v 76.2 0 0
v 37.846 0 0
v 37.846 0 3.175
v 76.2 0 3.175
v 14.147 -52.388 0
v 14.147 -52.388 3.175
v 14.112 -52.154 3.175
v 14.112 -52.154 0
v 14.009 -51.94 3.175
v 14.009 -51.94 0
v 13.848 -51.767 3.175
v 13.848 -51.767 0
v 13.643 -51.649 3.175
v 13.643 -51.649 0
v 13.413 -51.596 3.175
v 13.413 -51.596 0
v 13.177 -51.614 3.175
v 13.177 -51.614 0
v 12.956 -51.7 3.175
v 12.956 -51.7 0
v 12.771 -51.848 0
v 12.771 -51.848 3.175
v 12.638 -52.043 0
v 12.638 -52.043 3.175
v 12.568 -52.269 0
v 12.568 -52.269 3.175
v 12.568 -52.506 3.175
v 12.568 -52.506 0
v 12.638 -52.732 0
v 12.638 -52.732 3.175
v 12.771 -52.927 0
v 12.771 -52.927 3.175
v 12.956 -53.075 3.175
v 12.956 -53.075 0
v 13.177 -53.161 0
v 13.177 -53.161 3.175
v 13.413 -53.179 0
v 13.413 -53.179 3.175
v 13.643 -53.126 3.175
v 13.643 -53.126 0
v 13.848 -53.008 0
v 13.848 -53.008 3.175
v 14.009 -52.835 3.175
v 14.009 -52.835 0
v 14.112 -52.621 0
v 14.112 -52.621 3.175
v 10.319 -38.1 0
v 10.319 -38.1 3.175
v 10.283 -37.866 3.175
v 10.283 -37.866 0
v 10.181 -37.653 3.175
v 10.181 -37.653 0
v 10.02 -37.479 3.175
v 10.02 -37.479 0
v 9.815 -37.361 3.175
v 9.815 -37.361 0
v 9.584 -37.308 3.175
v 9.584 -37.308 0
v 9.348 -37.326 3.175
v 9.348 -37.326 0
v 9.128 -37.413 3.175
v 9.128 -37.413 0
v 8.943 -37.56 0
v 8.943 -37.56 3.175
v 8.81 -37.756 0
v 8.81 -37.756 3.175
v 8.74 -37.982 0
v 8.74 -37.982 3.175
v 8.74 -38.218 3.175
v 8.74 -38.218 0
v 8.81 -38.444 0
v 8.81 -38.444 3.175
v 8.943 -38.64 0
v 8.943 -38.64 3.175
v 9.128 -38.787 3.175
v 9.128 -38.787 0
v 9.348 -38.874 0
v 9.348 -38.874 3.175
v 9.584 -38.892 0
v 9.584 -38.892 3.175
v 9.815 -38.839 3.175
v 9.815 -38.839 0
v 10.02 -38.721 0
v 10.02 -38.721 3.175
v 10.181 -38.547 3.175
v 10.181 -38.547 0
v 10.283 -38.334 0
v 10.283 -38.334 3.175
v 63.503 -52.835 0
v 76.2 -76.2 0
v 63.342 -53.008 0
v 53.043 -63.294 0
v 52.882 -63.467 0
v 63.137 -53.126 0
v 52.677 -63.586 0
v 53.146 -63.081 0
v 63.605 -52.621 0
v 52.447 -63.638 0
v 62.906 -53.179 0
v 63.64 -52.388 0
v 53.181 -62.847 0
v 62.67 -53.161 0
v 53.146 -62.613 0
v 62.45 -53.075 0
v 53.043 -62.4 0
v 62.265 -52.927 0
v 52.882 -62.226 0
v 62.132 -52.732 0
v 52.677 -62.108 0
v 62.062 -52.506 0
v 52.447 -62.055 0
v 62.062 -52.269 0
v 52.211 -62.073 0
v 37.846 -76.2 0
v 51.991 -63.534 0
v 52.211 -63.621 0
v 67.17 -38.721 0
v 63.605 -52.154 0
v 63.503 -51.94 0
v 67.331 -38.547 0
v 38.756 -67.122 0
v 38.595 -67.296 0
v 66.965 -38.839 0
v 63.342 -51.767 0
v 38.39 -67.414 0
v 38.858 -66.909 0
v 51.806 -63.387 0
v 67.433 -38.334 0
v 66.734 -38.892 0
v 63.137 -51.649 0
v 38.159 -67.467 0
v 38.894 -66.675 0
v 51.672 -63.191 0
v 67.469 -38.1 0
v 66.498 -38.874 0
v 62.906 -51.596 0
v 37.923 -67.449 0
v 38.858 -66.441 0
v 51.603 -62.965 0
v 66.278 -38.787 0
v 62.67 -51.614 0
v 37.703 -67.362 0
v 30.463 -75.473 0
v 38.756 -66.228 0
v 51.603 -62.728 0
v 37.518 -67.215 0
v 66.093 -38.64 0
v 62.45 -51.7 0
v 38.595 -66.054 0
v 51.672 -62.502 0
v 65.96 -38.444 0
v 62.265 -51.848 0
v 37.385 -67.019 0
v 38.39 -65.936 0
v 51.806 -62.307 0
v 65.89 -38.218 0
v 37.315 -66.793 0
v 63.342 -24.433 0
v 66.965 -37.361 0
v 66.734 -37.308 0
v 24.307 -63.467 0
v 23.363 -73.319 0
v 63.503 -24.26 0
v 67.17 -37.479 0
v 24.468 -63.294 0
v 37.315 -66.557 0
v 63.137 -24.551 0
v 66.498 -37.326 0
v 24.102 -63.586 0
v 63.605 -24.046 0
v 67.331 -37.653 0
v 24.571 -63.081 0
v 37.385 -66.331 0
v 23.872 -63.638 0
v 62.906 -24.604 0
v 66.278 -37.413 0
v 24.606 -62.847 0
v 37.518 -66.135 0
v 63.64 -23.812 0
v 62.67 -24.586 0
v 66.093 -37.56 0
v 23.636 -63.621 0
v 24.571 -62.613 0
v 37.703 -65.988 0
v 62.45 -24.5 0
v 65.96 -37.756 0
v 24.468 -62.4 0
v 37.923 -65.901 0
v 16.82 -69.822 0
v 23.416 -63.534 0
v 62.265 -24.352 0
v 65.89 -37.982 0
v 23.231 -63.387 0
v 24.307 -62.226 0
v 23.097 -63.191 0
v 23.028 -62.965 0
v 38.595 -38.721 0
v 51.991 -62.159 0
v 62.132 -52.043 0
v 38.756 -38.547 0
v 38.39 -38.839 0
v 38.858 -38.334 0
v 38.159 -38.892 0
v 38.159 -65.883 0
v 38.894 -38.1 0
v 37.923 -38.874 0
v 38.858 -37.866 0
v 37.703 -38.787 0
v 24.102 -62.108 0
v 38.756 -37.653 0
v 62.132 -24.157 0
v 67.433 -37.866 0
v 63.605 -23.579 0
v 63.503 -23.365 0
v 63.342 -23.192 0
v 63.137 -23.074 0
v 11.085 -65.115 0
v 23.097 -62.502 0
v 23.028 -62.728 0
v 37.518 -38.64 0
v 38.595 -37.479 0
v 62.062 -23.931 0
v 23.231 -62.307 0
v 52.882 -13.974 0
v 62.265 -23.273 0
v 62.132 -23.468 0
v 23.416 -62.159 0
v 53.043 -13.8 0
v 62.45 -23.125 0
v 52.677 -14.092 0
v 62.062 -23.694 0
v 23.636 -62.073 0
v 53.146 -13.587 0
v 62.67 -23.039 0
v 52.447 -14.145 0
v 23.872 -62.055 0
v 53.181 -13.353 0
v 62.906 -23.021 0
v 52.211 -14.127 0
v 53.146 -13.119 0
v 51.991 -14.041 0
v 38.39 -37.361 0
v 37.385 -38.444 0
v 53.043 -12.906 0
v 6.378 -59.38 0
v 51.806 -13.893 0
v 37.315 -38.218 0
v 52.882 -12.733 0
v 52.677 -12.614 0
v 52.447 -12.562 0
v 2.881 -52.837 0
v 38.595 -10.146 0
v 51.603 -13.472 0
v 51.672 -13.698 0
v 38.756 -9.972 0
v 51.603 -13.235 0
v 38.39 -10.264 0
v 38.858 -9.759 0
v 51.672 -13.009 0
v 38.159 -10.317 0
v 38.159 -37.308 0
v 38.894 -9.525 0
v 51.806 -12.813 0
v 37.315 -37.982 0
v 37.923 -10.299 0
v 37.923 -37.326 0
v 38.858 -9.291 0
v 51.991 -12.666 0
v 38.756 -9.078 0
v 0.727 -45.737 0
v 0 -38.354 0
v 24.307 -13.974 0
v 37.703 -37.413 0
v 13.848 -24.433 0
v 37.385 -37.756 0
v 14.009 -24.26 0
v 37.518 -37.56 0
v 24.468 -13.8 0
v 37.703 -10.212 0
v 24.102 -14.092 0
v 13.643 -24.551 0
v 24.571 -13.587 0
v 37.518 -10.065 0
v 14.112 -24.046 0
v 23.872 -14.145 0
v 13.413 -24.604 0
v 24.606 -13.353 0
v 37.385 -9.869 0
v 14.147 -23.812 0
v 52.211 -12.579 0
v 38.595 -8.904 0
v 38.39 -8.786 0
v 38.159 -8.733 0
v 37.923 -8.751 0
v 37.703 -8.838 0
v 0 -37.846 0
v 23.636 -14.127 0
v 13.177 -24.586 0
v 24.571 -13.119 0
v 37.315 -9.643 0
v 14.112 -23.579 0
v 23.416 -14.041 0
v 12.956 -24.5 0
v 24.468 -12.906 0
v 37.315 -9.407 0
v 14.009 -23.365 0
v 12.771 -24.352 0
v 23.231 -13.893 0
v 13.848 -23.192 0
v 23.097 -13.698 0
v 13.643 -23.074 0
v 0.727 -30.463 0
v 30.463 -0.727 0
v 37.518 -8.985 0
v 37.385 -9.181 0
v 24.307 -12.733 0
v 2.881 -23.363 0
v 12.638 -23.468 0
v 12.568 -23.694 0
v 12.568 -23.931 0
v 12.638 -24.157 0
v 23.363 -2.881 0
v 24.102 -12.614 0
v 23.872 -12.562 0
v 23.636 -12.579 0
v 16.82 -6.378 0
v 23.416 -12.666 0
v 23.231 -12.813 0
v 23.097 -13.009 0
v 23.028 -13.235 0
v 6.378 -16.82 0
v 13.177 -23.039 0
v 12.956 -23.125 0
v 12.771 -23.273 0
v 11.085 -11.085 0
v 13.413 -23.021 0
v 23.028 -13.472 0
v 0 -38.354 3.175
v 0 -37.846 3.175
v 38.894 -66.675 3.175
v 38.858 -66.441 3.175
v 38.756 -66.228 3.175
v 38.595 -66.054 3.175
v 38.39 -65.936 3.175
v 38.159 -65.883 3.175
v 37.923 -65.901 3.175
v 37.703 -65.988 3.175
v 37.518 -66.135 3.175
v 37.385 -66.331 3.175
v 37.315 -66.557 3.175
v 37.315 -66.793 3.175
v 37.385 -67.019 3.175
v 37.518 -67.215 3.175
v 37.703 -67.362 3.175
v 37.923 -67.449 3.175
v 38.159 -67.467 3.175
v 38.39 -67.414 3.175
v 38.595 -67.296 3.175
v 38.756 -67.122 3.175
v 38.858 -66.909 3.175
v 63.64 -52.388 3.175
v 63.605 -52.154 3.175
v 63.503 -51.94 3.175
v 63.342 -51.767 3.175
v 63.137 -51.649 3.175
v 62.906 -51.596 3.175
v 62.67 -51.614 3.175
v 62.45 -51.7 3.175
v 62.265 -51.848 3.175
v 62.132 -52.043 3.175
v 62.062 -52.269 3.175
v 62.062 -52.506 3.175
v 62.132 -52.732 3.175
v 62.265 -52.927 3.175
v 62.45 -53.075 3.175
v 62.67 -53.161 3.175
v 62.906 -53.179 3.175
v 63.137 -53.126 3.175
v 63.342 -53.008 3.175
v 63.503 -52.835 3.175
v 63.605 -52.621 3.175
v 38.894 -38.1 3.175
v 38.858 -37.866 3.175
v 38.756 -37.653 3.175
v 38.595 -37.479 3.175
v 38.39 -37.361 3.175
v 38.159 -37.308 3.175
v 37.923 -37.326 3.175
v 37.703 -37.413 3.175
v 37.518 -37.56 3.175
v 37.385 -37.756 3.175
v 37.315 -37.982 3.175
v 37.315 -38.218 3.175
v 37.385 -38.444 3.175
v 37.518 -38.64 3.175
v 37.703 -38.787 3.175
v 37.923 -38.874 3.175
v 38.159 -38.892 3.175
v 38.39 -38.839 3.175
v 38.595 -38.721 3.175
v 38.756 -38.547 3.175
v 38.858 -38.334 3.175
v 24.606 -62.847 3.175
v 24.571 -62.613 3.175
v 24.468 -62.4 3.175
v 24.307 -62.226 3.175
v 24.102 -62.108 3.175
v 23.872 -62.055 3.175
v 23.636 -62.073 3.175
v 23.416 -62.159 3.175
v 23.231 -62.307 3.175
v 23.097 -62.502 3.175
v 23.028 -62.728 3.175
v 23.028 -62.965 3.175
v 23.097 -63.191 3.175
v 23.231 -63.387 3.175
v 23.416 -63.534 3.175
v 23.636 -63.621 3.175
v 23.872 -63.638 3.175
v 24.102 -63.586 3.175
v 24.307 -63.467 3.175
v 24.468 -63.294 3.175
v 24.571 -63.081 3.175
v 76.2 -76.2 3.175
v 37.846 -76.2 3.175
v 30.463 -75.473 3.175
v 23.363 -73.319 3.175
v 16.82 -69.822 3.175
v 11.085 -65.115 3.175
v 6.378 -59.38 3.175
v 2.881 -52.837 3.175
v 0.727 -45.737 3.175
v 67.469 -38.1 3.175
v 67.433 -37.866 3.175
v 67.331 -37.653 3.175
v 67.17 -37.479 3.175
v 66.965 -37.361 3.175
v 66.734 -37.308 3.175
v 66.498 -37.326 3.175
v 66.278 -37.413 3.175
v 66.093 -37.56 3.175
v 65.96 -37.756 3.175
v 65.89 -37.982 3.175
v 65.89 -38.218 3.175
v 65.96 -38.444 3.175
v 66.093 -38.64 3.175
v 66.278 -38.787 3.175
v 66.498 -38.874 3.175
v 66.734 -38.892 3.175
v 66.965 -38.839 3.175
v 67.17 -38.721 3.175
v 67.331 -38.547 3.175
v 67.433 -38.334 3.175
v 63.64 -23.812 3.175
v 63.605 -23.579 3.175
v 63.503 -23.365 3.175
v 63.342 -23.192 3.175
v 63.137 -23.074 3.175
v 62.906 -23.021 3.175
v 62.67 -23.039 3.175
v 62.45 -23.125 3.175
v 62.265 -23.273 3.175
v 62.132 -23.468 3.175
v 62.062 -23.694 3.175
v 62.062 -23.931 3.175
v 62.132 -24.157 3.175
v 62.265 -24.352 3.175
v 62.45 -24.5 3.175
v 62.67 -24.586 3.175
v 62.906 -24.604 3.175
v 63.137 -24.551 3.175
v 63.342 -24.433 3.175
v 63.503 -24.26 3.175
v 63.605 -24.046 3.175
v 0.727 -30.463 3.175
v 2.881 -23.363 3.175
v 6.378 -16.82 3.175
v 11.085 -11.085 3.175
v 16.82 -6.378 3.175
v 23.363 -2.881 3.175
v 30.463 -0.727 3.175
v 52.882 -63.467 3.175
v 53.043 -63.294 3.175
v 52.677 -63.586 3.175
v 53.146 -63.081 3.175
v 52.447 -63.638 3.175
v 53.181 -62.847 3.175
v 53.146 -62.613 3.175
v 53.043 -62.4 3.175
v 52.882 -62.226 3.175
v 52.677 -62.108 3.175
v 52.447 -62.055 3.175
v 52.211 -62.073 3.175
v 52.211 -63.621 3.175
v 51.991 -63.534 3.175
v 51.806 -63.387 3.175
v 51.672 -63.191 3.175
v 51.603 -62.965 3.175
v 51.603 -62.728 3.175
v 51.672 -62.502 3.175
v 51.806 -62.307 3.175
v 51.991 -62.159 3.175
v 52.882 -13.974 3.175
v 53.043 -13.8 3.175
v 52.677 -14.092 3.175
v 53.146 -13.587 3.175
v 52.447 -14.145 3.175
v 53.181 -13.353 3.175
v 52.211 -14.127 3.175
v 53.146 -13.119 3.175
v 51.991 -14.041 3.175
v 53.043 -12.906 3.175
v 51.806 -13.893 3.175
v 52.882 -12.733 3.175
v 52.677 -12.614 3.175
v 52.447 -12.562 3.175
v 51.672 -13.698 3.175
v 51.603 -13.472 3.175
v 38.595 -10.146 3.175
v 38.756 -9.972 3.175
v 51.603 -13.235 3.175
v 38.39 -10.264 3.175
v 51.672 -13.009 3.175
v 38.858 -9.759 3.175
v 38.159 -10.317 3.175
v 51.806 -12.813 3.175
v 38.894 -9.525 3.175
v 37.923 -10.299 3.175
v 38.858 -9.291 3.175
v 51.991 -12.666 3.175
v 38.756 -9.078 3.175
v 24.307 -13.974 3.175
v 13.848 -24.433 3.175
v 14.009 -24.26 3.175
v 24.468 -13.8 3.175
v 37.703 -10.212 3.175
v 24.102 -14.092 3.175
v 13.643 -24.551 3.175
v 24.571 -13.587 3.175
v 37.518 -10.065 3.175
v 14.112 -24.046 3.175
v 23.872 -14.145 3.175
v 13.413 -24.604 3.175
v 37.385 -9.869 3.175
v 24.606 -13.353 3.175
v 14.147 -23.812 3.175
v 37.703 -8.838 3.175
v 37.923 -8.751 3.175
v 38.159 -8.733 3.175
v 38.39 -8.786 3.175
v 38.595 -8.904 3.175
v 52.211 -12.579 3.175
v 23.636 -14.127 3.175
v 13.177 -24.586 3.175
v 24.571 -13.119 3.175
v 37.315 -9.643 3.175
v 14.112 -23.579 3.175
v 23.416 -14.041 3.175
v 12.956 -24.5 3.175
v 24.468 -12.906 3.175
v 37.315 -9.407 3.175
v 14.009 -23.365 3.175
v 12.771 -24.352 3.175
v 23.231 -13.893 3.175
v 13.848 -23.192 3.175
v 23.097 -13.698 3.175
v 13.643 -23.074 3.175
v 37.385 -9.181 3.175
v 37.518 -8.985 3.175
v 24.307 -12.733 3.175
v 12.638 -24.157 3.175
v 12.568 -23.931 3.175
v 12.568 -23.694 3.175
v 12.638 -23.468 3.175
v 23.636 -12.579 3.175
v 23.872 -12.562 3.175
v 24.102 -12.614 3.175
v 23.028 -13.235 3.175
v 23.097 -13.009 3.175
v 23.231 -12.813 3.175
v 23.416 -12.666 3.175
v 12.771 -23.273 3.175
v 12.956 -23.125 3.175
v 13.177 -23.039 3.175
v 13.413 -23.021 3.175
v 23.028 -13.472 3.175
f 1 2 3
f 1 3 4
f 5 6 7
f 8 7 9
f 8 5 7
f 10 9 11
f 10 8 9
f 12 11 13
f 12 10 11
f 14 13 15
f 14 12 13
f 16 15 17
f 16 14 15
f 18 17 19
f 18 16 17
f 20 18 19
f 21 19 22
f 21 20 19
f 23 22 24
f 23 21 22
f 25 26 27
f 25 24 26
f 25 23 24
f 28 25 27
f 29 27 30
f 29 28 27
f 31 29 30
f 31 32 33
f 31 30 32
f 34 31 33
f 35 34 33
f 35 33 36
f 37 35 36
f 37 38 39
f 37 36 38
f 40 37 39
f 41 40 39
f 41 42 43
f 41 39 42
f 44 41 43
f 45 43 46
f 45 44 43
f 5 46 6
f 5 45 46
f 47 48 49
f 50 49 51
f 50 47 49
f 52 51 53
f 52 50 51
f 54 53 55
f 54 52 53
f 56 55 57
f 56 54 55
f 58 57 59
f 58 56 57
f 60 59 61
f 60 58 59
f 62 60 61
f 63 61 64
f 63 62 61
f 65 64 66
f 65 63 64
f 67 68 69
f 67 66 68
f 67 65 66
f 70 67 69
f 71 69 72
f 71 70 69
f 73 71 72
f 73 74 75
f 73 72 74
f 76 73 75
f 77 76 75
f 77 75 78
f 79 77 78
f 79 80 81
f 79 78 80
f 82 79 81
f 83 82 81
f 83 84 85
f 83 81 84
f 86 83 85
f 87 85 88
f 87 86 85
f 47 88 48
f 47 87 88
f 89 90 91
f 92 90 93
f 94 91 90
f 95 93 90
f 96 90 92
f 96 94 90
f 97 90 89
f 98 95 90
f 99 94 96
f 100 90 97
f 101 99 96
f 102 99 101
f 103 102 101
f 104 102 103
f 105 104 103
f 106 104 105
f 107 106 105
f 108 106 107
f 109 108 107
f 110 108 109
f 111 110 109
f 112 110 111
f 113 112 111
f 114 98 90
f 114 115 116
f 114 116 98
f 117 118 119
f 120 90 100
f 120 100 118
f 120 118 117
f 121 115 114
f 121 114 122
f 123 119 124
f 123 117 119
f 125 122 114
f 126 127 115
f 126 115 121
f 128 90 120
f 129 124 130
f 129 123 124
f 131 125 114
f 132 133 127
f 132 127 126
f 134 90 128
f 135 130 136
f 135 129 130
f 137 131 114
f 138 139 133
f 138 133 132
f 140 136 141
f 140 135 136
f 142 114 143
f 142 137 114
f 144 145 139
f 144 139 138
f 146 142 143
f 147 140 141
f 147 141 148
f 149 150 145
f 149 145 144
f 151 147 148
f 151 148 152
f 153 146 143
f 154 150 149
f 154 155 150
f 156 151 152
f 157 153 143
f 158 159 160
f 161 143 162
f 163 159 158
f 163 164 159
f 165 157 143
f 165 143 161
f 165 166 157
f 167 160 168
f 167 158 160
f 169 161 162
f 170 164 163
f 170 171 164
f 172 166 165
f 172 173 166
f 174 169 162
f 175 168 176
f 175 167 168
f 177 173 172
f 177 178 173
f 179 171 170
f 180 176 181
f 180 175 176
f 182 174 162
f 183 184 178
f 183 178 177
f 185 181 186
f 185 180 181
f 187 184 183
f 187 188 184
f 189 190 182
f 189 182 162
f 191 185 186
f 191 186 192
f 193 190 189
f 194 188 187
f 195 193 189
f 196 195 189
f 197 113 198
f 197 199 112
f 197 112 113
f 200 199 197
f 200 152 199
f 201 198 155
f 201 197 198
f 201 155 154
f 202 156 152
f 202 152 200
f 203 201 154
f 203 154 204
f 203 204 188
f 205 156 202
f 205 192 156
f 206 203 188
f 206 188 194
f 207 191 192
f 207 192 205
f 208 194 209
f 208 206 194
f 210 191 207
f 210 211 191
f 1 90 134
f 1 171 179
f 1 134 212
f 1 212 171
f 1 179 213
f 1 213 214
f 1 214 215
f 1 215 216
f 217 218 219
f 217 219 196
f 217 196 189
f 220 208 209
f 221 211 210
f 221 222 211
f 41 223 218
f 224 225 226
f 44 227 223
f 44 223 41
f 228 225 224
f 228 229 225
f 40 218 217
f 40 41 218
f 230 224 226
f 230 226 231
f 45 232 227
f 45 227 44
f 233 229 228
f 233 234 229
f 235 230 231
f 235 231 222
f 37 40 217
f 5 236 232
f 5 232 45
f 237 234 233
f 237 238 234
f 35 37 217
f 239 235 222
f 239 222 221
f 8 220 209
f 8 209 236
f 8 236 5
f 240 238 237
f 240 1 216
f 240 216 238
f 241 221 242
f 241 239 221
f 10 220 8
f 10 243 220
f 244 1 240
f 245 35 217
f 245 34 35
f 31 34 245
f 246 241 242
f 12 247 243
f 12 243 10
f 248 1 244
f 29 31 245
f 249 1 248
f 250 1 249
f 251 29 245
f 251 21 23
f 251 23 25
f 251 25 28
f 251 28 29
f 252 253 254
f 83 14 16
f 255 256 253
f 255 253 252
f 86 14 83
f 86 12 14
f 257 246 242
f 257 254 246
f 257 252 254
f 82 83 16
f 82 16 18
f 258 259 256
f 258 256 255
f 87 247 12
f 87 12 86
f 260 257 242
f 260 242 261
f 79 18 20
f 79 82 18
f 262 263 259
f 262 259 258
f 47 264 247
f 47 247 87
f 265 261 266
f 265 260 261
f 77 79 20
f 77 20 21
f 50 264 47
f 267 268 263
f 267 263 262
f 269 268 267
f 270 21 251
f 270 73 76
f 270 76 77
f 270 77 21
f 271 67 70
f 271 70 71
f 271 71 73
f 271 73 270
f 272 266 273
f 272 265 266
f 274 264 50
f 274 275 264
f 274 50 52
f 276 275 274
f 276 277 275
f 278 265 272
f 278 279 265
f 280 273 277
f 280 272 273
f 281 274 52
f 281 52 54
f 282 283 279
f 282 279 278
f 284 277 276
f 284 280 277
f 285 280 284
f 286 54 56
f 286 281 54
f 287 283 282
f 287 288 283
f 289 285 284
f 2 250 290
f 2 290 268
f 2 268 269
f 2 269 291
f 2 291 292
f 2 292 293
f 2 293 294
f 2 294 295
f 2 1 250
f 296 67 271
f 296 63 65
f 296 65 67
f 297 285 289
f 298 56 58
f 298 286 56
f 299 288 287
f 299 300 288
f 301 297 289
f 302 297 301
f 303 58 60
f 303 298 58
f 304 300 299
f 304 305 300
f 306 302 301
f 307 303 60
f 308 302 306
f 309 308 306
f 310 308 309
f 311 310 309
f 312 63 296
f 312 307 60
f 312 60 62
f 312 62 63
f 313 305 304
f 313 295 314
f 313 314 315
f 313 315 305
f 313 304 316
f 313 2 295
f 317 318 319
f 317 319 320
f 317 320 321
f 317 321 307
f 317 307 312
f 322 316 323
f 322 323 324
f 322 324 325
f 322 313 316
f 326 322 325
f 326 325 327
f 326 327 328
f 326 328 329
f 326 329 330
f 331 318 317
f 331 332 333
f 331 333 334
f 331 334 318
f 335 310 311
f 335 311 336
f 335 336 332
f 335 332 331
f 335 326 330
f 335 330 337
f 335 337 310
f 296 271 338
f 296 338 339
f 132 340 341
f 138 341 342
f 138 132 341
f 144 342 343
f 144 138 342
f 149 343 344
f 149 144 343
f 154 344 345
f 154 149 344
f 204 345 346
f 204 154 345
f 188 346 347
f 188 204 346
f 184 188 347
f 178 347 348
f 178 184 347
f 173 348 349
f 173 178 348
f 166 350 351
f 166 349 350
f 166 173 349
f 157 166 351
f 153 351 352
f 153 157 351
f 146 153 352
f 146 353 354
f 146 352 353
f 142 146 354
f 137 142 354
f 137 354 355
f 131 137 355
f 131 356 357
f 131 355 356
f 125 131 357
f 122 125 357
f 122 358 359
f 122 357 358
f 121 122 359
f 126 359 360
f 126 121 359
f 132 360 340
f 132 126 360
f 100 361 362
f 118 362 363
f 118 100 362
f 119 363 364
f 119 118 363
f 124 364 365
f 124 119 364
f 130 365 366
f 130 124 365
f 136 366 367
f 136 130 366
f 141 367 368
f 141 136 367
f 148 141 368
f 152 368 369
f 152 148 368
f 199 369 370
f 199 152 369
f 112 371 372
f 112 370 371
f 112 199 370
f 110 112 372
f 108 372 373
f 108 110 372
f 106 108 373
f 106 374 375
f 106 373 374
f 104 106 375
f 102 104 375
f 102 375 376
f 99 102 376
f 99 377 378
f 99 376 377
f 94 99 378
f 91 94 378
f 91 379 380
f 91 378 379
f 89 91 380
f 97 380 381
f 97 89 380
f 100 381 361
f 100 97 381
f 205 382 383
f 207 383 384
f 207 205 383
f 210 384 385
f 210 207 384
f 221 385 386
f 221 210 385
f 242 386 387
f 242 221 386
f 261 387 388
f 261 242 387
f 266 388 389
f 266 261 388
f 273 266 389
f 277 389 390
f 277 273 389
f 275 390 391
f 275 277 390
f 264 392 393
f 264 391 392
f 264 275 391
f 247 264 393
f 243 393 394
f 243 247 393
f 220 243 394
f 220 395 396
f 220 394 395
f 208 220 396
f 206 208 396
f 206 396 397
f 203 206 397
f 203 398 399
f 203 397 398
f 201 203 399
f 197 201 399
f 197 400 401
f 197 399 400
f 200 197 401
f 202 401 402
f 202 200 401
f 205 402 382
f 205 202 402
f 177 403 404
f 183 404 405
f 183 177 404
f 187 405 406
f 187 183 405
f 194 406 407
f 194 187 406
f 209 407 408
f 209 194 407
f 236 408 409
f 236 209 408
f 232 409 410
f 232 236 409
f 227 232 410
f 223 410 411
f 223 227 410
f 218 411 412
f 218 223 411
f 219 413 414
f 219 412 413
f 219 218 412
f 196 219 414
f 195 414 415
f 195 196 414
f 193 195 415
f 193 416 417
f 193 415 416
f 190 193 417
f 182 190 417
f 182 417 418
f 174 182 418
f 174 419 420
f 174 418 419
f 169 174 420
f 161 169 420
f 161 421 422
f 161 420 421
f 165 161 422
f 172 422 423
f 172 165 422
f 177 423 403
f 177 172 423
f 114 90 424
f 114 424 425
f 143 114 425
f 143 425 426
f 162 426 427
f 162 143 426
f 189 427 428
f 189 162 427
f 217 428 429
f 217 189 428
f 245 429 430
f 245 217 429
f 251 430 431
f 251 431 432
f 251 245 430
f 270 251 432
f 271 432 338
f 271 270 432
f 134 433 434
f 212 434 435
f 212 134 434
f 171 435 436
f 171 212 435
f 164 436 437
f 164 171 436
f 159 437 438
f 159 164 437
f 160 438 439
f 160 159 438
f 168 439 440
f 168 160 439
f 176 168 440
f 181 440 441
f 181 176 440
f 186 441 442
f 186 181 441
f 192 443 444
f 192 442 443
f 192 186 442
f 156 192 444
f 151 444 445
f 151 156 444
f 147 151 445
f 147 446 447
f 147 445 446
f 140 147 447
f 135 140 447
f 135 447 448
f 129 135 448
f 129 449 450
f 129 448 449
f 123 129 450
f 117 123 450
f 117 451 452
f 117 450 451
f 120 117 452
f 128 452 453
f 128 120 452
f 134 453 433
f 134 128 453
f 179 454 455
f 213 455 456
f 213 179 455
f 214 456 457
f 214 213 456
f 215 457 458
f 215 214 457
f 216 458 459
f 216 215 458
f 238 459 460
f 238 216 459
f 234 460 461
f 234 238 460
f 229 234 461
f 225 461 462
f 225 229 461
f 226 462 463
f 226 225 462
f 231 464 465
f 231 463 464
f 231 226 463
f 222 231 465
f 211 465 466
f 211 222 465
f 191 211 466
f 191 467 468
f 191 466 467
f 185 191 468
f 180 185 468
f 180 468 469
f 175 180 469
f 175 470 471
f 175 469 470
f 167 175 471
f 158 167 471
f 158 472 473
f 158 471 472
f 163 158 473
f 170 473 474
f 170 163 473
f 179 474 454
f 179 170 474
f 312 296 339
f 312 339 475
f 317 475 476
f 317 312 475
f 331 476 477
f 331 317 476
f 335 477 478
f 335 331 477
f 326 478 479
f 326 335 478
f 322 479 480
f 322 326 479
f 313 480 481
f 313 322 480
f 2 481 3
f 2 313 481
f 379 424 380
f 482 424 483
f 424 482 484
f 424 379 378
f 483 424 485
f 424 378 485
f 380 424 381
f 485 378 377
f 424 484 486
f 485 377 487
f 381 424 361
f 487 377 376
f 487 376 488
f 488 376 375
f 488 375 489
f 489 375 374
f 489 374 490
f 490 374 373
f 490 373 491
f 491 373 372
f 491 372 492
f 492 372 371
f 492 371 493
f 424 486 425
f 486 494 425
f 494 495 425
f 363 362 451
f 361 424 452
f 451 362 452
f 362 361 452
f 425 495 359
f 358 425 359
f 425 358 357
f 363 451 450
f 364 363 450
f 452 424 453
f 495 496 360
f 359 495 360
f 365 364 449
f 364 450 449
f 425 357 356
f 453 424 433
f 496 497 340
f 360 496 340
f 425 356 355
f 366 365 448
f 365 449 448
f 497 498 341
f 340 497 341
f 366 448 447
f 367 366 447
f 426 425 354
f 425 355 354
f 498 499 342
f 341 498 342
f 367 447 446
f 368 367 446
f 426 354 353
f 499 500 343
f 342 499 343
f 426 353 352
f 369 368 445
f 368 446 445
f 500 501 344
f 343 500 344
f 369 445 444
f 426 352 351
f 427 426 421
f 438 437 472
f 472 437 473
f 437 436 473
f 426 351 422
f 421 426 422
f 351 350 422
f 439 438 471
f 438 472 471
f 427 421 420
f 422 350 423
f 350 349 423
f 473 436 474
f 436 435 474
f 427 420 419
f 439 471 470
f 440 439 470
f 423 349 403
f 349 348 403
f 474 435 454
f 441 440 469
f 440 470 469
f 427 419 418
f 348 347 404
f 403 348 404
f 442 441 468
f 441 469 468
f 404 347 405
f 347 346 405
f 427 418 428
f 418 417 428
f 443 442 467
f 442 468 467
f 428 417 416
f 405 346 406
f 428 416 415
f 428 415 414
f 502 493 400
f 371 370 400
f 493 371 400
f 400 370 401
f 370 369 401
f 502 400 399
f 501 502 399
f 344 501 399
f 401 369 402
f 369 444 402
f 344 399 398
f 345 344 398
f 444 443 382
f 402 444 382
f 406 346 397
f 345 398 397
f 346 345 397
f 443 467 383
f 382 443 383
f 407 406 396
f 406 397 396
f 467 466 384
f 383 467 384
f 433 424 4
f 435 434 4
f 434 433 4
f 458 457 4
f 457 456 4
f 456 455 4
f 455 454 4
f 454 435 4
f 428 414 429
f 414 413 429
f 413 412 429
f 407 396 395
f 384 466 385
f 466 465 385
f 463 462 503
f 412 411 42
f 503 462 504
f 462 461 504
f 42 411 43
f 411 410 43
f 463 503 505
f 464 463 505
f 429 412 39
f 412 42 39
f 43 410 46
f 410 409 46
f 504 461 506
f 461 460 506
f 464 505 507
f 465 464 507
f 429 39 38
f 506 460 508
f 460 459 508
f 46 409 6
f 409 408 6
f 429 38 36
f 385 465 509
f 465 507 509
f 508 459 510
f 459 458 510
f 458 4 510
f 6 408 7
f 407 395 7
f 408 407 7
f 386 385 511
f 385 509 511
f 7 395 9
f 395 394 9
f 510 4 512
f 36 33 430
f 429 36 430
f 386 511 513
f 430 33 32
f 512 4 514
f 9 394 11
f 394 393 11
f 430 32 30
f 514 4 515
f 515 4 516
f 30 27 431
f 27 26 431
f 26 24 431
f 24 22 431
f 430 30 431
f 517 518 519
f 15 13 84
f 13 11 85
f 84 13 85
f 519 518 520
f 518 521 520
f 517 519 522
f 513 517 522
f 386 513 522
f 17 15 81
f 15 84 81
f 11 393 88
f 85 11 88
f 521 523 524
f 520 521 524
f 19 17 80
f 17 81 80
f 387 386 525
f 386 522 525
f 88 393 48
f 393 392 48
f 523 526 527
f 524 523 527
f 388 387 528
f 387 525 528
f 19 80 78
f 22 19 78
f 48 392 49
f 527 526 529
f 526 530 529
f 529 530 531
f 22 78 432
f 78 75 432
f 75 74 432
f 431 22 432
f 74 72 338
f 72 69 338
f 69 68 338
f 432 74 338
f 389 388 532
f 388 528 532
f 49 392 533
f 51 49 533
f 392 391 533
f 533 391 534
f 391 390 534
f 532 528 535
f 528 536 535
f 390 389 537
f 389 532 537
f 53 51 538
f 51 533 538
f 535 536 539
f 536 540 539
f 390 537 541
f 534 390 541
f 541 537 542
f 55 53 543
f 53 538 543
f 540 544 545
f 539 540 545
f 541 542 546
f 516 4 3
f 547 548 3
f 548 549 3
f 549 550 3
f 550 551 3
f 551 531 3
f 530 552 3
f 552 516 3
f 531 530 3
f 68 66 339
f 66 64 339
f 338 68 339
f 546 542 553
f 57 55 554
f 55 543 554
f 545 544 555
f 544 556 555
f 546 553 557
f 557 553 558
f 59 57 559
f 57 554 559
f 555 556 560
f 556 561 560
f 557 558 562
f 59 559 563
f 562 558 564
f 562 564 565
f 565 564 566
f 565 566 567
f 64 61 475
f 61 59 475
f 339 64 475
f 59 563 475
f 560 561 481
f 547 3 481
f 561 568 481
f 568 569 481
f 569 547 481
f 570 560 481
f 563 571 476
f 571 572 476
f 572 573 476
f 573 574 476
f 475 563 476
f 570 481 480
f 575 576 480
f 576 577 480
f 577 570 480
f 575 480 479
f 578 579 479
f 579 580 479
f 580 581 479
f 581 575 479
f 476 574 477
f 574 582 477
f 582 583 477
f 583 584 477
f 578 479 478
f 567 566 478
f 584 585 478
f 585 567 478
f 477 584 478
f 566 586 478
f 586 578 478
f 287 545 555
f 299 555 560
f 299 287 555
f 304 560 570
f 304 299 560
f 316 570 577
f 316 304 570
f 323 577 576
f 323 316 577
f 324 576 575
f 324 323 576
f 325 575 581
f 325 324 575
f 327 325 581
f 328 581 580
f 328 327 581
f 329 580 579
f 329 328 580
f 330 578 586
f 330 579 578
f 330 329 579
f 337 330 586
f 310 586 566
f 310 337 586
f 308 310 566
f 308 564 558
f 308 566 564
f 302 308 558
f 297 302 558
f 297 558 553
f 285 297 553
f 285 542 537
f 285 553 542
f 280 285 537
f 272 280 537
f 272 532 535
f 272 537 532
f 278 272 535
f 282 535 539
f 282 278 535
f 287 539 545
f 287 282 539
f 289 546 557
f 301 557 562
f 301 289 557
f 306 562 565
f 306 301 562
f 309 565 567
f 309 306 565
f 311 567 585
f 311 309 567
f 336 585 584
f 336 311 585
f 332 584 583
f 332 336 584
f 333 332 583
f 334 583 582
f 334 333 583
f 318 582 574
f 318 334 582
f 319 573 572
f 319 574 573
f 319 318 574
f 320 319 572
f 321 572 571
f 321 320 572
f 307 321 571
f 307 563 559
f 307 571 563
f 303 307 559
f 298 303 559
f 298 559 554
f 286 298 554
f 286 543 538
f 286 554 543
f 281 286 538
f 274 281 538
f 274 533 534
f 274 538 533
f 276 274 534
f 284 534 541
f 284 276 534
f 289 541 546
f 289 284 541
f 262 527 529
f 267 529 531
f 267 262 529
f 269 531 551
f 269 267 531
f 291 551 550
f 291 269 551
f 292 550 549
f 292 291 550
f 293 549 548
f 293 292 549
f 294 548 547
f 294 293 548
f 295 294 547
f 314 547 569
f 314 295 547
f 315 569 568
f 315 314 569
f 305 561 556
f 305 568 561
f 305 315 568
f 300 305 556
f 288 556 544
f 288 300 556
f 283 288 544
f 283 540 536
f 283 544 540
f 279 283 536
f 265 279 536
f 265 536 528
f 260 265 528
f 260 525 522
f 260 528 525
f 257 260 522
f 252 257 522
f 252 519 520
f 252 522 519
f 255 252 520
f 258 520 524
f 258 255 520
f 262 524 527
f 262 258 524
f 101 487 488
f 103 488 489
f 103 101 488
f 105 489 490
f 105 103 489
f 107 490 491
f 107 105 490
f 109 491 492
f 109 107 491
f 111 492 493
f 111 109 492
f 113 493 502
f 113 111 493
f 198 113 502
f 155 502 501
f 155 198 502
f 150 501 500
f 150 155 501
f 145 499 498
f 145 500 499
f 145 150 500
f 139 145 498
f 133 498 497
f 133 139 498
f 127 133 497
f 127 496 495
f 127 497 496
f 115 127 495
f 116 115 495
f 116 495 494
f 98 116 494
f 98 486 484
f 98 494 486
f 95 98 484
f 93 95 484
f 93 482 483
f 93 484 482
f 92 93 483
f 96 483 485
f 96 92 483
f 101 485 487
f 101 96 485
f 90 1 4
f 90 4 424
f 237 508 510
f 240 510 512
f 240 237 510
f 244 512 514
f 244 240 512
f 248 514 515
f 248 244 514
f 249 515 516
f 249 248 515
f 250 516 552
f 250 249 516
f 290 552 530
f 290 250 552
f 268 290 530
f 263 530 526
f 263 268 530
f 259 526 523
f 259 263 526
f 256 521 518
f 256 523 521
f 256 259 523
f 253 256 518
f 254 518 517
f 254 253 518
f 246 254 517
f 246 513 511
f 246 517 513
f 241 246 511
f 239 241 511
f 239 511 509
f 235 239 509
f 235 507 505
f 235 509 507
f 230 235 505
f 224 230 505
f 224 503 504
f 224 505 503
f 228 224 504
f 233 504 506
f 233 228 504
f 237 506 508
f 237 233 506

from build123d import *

# Parameters (mm, degrees)
BOSS_EXTRUDE1_DEPTH = 3.175
SKETCH5_R           = 0.79375
CUT_EXTRUDE10_DEPTH = 19.05


with BuildPart() as part:
    # Sketch2 → Boss-Extrude1 (new body)
    with BuildSketch(Plane.XY):
        with BuildLine():
            Line((76.2, 0), (76.2, -76.2))
            Line((76.2, -76.2), (37.846, -76.2))
            ThreePointArc((37.846, -76.2), (11.084836759, -65.115163241), (0, -38.354))
            Line((0, -38.354), (0, -37.846))
            ThreePointArc((0, -37.846), (11.084836759, -11.084836759), (37.846, 0))
            Line((37.846, 0), (76.2, 0))
        make_face()
    extrude(amount=BOSS_EXTRUDE1_DEPTH)

    # Sketch5 → Cut-Extrude10 (cut)
    with BuildSketch(Plane.XY):
        with Locations((38.1, -38.1)):
            Circle(SKETCH5_R)
        with Locations((66.675, -38.1)):
            Circle(SKETCH5_R)
        with Locations((62.846675913, -52.3875)):
            Circle(SKETCH5_R)
        with Locations((52.3875, -62.846675913)):
            Circle(SKETCH5_R)
        with Locations((38.1, -66.675)):
            Circle(SKETCH5_R)
        with Locations((23.8125, -62.846675913)):
            Circle(SKETCH5_R)
        with Locations((13.353324087, -52.3875)):
            Circle(SKETCH5_R)
        with Locations((9.525, -38.1)):
            Circle(SKETCH5_R)
        with Locations((13.353324087, -23.8125)):
            Circle(SKETCH5_R)
        with Locations((23.8125, -13.353324087)):
            Circle(SKETCH5_R)
        with Locations((38.1, -9.525)):
            Circle(SKETCH5_R)
        with Locations((52.3875, -13.353324087)):
            Circle(SKETCH5_R)
        with Locations((62.846675913, -23.8125)):
            Circle(SKETCH5_R)
    extrude(amount=CUT_EXTRUDE10_DEPTH, mode=Mode.SUBTRACT)


solid = part.part
